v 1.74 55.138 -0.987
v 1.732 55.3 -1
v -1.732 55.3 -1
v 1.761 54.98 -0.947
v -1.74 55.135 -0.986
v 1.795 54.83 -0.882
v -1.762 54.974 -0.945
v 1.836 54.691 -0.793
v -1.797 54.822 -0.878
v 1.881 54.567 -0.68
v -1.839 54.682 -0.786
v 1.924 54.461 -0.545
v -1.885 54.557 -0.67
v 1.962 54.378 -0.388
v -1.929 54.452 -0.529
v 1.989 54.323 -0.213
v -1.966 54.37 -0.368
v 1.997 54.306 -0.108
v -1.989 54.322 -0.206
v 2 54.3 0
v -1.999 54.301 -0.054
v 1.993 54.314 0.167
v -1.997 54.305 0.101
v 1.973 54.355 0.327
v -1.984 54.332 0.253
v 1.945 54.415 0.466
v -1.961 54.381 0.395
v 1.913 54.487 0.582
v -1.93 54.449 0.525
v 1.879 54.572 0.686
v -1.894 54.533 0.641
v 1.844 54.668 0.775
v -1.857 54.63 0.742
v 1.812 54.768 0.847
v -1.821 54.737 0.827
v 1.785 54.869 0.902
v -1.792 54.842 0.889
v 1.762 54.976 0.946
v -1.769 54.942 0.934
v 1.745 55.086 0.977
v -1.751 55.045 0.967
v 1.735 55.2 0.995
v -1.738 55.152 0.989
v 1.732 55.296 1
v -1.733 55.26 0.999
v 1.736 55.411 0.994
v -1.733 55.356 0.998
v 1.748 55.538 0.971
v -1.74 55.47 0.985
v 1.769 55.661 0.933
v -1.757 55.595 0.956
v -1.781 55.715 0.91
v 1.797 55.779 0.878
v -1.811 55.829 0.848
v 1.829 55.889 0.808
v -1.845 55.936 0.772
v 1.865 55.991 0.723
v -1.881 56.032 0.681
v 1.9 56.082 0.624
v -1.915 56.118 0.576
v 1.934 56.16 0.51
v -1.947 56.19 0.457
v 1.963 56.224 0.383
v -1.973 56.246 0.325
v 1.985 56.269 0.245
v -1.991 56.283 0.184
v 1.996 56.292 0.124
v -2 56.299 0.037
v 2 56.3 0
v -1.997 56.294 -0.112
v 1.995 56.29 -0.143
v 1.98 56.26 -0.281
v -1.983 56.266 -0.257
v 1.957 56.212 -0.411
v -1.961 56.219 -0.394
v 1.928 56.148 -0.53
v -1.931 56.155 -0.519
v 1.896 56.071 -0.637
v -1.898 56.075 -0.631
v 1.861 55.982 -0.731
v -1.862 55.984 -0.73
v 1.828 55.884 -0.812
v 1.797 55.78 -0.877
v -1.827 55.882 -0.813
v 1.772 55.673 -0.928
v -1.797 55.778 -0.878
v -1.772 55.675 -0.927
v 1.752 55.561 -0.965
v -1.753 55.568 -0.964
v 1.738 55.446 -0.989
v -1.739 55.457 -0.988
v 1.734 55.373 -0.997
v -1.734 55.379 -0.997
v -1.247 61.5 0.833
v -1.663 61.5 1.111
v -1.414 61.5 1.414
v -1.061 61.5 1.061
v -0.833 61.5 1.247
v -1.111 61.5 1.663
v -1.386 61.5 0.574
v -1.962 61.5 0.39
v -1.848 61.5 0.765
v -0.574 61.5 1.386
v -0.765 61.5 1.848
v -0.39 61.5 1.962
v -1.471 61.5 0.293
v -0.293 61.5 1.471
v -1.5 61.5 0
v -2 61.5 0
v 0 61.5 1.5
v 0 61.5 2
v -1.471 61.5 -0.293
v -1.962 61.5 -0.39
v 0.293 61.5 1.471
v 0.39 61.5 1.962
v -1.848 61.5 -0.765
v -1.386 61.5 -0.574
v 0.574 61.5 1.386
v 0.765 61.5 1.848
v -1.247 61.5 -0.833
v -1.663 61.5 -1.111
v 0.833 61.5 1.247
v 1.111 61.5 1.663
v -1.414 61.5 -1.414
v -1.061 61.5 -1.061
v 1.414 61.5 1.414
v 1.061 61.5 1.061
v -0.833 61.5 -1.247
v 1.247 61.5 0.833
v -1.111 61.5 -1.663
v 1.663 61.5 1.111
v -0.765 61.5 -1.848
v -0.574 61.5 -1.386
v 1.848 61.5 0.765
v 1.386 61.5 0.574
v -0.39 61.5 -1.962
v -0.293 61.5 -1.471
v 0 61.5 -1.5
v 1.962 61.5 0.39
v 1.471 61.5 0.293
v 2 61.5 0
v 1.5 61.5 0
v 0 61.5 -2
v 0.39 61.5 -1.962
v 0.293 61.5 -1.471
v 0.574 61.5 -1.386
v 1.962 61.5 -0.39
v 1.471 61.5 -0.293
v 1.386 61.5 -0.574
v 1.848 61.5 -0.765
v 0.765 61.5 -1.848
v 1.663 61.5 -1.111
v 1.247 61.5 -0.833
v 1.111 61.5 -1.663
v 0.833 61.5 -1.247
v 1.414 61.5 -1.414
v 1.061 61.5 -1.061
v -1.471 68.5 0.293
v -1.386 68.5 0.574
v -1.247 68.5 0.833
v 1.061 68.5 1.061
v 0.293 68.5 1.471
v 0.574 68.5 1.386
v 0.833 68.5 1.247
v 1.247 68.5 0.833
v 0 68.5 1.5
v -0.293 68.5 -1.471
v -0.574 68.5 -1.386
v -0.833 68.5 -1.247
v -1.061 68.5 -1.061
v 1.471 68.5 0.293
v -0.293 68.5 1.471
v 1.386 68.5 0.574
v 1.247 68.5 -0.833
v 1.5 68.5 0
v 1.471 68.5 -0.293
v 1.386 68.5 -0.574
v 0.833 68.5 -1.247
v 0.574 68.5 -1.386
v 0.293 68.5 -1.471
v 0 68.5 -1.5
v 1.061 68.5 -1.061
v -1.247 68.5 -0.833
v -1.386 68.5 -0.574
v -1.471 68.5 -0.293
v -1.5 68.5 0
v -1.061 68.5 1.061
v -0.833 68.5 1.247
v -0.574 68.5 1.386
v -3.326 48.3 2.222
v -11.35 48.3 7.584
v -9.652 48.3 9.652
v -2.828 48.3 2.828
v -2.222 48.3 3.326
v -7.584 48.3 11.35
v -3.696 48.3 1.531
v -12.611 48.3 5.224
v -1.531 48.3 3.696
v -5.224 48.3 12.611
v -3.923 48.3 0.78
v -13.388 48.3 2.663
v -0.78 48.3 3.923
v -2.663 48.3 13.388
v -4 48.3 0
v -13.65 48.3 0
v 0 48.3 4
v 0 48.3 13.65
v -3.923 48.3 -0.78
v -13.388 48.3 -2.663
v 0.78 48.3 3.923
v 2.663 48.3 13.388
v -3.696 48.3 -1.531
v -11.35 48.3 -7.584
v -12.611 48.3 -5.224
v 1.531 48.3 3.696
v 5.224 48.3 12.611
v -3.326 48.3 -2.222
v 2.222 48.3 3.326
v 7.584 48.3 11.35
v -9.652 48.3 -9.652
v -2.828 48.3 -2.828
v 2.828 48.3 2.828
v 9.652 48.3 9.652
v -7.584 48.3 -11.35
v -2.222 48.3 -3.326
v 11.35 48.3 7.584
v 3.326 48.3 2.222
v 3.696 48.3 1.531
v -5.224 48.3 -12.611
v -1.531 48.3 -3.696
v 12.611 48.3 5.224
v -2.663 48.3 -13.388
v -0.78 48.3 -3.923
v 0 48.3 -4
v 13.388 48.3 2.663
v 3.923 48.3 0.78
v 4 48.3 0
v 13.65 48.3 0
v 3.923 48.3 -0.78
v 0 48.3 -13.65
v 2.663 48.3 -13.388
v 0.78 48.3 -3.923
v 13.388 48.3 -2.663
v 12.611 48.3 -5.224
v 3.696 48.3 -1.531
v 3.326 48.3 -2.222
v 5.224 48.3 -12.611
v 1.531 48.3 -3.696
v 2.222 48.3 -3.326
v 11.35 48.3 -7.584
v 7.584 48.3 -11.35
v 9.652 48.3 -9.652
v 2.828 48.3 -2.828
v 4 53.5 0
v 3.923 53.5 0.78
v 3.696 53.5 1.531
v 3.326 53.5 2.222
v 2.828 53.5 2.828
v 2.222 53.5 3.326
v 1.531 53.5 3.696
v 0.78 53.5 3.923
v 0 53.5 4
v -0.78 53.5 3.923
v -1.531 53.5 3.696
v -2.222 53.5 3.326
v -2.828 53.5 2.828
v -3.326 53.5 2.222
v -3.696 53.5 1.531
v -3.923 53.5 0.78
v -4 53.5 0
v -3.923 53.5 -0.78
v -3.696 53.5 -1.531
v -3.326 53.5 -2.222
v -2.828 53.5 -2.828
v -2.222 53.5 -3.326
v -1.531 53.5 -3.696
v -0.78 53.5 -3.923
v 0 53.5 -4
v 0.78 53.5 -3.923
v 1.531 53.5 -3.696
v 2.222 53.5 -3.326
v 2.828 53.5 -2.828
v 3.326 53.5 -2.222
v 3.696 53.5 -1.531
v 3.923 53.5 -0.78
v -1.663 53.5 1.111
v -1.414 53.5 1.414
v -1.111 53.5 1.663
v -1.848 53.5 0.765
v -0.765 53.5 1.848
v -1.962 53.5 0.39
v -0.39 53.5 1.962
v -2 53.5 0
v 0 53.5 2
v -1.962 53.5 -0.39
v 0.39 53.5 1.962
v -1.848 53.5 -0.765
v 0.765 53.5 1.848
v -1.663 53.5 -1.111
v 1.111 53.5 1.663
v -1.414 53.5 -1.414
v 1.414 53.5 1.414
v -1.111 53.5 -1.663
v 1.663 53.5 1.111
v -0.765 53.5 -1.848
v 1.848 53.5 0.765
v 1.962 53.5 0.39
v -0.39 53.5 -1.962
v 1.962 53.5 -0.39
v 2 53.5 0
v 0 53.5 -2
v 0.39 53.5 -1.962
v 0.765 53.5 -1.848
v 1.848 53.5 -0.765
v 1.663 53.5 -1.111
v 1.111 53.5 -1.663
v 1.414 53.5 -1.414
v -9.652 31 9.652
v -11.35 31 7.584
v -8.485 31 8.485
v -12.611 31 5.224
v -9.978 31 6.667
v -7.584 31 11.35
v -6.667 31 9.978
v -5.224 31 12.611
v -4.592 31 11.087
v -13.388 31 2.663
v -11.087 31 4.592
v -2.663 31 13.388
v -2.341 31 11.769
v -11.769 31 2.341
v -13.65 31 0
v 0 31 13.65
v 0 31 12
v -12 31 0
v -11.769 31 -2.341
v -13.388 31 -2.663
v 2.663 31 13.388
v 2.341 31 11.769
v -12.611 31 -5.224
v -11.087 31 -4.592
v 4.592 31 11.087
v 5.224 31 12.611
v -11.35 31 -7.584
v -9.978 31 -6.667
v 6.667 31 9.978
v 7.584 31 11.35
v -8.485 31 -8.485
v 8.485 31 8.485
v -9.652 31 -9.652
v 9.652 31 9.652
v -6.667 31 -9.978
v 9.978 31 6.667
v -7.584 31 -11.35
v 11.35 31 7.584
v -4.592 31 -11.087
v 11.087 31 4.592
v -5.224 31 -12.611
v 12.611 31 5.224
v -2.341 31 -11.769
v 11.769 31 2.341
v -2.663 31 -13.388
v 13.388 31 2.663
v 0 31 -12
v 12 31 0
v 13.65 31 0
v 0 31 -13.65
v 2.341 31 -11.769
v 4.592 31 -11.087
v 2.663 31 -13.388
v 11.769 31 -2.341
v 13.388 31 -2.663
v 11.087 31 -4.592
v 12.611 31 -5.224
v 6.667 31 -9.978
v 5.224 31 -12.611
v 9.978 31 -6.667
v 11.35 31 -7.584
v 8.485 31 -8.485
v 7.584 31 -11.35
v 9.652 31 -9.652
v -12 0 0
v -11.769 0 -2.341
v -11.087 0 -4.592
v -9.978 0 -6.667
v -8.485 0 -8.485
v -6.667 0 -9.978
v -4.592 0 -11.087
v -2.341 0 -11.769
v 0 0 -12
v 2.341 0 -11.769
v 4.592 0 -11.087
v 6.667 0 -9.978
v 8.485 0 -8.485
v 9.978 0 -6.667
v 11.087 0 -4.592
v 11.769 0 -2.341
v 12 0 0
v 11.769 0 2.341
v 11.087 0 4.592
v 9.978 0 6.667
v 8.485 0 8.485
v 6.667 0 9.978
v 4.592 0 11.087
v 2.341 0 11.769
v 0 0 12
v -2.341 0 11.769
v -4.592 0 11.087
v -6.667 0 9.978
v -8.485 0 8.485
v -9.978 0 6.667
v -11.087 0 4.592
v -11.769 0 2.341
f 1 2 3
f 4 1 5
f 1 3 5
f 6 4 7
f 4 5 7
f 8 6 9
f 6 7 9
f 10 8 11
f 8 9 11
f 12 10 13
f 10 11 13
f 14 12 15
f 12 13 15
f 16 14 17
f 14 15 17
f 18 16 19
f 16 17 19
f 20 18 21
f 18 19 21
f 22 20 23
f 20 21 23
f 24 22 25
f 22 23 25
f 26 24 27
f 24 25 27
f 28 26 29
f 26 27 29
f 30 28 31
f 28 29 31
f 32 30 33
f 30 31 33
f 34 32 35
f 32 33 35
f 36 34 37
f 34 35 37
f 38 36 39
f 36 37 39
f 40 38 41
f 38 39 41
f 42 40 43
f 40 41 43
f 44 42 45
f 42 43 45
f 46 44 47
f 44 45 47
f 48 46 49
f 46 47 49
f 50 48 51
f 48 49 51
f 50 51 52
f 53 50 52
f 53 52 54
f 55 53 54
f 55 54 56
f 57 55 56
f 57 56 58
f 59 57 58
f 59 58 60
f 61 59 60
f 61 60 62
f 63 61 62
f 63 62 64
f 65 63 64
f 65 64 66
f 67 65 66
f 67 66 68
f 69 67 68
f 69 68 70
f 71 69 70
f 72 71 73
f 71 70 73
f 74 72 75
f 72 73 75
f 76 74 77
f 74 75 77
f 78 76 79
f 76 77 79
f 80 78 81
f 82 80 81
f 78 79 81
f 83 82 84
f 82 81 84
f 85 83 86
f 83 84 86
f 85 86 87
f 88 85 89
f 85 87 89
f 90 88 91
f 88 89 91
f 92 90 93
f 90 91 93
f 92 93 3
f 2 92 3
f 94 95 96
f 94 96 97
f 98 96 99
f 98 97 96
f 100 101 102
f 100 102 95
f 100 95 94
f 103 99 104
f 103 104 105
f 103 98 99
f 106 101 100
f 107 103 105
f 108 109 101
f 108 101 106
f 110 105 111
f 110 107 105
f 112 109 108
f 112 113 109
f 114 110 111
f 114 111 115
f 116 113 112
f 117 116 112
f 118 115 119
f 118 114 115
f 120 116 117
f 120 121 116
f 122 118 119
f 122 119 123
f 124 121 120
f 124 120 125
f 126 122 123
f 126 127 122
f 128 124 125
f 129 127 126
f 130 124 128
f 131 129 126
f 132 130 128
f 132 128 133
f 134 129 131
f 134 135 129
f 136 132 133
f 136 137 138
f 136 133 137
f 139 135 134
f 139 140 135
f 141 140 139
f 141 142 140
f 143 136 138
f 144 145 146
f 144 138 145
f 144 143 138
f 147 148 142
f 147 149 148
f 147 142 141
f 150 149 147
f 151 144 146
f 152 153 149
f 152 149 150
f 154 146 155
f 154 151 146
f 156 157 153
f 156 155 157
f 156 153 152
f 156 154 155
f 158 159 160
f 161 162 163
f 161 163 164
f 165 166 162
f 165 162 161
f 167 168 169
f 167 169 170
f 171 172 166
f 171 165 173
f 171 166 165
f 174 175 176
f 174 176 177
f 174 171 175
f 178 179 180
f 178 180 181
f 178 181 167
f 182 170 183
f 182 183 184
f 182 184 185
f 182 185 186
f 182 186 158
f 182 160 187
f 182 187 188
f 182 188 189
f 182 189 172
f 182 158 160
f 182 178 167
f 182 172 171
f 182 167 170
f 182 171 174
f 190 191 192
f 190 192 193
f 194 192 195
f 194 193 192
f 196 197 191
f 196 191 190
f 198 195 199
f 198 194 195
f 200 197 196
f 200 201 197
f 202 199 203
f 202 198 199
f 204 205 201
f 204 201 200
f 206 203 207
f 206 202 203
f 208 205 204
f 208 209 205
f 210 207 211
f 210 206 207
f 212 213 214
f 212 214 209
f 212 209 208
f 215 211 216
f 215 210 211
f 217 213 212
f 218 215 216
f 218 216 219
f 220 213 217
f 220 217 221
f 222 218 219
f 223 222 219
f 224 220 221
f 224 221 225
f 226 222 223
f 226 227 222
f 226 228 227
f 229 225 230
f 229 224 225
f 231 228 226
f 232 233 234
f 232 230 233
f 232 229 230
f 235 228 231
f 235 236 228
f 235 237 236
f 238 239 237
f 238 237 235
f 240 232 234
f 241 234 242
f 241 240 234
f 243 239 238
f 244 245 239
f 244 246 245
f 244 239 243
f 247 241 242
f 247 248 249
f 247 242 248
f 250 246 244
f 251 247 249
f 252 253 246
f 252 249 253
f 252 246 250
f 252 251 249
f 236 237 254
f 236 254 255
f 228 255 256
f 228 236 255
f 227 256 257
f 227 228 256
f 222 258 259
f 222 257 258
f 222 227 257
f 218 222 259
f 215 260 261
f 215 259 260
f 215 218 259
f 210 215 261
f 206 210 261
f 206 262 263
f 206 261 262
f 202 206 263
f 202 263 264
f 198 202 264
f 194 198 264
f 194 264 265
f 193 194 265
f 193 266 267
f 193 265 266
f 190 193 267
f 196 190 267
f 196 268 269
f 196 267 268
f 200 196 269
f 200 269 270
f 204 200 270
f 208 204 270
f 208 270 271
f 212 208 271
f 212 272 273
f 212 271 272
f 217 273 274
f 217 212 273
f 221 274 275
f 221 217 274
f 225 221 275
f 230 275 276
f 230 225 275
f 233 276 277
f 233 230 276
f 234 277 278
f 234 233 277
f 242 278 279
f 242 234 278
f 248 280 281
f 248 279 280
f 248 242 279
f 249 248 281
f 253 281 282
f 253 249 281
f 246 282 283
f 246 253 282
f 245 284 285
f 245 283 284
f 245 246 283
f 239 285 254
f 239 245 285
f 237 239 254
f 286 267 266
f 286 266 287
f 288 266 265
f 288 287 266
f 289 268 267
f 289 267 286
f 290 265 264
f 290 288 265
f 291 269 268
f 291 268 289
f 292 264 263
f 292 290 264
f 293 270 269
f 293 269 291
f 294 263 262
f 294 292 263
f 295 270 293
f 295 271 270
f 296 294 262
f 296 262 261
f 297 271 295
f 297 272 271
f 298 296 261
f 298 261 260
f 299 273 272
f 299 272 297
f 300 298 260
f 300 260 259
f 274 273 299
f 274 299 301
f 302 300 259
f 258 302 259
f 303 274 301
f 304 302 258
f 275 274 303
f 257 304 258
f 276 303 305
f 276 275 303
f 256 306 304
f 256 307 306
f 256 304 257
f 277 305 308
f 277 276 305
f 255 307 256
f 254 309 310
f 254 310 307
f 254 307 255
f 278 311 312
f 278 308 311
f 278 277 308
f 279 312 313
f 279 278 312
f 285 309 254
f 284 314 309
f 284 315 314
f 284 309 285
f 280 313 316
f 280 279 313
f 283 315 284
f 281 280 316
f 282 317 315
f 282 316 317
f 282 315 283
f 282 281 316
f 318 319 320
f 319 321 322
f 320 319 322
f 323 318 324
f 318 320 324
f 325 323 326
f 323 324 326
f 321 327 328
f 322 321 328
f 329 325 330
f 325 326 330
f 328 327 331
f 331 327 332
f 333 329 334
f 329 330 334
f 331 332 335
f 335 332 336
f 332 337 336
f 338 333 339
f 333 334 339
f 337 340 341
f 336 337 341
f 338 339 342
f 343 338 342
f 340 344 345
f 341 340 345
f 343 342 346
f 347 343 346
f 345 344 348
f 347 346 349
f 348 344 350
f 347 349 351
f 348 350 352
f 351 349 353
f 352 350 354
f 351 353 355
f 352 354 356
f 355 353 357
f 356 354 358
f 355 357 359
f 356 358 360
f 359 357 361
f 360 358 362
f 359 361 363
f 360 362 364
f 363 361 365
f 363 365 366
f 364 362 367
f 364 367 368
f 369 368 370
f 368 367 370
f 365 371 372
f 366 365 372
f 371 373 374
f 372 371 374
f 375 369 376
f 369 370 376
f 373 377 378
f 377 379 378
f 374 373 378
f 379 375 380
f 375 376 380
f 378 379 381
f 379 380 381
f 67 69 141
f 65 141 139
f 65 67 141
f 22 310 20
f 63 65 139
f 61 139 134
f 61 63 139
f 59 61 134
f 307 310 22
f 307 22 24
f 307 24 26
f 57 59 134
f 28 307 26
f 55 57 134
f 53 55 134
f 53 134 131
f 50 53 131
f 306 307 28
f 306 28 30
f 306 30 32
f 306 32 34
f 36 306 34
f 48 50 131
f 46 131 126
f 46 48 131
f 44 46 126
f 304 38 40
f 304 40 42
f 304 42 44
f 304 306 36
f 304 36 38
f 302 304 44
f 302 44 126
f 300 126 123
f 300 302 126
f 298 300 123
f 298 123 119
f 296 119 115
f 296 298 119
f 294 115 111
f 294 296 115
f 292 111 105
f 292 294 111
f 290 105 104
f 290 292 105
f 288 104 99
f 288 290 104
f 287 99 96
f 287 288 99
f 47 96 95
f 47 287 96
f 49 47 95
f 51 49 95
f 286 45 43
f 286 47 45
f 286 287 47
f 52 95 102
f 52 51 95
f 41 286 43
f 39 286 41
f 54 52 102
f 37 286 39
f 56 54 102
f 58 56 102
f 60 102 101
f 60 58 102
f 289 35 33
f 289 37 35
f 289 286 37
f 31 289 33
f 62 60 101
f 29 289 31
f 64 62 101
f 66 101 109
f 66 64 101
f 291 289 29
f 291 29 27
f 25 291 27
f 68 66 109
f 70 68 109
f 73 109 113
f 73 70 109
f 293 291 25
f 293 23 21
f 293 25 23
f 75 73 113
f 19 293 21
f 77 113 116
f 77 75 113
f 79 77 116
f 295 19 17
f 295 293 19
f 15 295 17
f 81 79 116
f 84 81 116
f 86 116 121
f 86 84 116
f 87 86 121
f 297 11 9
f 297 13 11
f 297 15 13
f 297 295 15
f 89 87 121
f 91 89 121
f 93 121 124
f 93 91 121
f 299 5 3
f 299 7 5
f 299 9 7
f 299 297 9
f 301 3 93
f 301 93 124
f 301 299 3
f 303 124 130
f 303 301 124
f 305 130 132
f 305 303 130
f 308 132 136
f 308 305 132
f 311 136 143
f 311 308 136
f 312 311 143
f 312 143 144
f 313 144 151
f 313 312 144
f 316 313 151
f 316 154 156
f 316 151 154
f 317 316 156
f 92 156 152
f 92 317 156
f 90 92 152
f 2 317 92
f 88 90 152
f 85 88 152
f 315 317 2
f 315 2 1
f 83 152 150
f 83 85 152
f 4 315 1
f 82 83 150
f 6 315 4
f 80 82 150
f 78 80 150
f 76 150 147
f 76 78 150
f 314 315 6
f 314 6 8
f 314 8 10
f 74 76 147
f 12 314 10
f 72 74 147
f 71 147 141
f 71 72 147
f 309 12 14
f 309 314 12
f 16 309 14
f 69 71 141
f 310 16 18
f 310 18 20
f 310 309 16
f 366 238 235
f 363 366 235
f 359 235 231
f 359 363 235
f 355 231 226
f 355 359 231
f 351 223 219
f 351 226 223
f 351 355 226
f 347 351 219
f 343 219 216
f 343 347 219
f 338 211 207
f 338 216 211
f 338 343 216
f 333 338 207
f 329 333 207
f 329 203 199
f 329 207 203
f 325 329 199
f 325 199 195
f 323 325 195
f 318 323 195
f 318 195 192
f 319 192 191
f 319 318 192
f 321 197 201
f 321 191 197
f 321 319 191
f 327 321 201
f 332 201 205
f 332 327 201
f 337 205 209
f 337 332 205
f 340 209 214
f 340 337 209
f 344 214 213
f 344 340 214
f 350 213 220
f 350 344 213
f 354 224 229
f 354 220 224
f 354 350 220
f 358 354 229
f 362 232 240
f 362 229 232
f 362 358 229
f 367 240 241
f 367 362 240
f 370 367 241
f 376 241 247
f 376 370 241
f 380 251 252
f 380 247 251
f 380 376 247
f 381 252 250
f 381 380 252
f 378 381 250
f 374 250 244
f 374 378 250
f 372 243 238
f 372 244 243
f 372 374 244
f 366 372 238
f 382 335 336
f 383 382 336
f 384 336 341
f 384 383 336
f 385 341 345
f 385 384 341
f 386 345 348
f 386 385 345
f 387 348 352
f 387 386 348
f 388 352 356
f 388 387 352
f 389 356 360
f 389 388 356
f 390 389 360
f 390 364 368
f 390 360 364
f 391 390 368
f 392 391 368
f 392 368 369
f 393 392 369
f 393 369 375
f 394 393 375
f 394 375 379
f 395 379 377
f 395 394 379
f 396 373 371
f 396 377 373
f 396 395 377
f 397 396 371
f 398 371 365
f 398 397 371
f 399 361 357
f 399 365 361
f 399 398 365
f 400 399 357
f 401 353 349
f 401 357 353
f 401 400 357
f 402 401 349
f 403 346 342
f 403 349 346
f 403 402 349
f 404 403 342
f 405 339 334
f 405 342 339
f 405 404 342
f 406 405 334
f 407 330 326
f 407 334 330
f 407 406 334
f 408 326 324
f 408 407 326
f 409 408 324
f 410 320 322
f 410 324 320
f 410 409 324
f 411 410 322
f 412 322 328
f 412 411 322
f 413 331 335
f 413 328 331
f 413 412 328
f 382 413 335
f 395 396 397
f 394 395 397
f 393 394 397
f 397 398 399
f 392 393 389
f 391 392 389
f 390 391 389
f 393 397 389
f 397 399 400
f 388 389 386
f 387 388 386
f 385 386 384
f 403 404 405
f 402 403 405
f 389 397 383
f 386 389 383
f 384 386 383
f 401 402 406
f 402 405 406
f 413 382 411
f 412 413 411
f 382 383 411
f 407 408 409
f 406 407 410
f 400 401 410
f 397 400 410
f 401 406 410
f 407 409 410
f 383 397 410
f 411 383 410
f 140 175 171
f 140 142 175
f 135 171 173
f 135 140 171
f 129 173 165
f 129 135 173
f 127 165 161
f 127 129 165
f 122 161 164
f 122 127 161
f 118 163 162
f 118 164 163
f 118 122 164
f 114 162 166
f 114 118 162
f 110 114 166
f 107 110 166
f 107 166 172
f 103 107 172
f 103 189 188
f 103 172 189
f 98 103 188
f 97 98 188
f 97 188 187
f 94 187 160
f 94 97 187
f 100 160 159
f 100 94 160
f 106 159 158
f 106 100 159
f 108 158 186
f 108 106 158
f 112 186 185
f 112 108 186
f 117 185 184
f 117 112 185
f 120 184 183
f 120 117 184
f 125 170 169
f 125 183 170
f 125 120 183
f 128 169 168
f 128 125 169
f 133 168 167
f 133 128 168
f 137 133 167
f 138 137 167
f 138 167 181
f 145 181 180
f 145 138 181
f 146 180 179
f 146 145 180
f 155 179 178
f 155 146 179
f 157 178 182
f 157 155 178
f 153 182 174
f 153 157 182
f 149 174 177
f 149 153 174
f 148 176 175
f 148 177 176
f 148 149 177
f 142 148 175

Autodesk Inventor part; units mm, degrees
ref_plane "YZ Plane" through (0, 0, 0) normal (1, 0, 0) x (0, 1, 0)
ref_plane "XZ Plane" through (0, 0, 0) normal (0, 1, 0) x (-1, 0, 0)
ref_plane "XY Plane" through (0, 0, 0) normal (0, 0, 1) x (1, 0, 0)
sketch "スケッチ8" plane through (0, 0, 0) normal (0, 1, 0) x (-1, 0, 0)
  circle A0 centre (0, 0) radius 12
  dimension "d29" = 24
extrude "押し出し6" add sketch "スケッチ8" along normal blind 31
ref_plane "作業平面4" through (0, 31, 0) normal (0, 1, 0) x (1, 0, 0)
sketch "スケッチ9" plane through (0, 31, 0) normal (0, 1, 0) x (1, 0, 0)
  circle A0 centre (0, 0) radius 13.65
  dimension "d33" = 27.3
extrude "押し出し7" add sketch "スケッチ9" along normal blind 17.3
ref_plane "作業平面5" through (0, 48.3, 0) normal (0, 1, 0) x (1, 0, 0)
sketch "スケッチ10" plane through (0, 48.3, 0) normal (0, 1, 0) x (1, 0, 0)
  circle A0 centre (0, 0) radius 4
  dimension "d37" = 8
extrude "押し出し8" add sketch "スケッチ10" along normal blind 5.2
ref_plane "作業平面6" through (0, 53.5, 0) normal (0, 1, 0) x (1, 0, 0)
sketch "スケッチ11" plane through (0, 53.5, 0) normal (0, 1, 0) x (1, 0, 0)
  circle A0 centre (0, 0) radius 2
  dimension "d41" = 4
extrude "押し出し9" add sketch "スケッチ11" along normal blind 8
ref_plane "作業平面7" through (0, 61.5, 0) normal (0, 1, 0) x (1, 0, 0)
sketch "スケッチ12" plane through (0, 61.5, 0) normal (0, 1, 0) x (1, 0, 0)
  circle A0 centre (0, 0) radius 1.5
  dimension "d45" = 3
extrude "押し出し10" add sketch "スケッチ12" along normal blind 7
sketch "スケッチ13" plane through (0, 61.5, 0) normal (0, 1, 0) x (1, 0, 0)
  circle A0 centre (0, 0) radius 2 projected
  point P0 (2, 0)
ref_plane "作業平面8" through (2, 61.5, 0) normal (1, 0, 0) x (0, 1, 0)
sketch "スケッチ14" plane through (2, 61.5, 0) normal (1, 0, 0) x (0, 1, 0)
  circle A0 centre (-6.2, 0) radius 1
  line L0 (0, -2) -> (0, 2) projected
  point P0 (-61.5, 0)
  dimension "d48" = 2
  dimension "d49" = 6.2
hole "穴2" at (2, 55.3, 0) direction (-1, 0, 0) diameter 2 end through all
properties part number "daisen_motor"
